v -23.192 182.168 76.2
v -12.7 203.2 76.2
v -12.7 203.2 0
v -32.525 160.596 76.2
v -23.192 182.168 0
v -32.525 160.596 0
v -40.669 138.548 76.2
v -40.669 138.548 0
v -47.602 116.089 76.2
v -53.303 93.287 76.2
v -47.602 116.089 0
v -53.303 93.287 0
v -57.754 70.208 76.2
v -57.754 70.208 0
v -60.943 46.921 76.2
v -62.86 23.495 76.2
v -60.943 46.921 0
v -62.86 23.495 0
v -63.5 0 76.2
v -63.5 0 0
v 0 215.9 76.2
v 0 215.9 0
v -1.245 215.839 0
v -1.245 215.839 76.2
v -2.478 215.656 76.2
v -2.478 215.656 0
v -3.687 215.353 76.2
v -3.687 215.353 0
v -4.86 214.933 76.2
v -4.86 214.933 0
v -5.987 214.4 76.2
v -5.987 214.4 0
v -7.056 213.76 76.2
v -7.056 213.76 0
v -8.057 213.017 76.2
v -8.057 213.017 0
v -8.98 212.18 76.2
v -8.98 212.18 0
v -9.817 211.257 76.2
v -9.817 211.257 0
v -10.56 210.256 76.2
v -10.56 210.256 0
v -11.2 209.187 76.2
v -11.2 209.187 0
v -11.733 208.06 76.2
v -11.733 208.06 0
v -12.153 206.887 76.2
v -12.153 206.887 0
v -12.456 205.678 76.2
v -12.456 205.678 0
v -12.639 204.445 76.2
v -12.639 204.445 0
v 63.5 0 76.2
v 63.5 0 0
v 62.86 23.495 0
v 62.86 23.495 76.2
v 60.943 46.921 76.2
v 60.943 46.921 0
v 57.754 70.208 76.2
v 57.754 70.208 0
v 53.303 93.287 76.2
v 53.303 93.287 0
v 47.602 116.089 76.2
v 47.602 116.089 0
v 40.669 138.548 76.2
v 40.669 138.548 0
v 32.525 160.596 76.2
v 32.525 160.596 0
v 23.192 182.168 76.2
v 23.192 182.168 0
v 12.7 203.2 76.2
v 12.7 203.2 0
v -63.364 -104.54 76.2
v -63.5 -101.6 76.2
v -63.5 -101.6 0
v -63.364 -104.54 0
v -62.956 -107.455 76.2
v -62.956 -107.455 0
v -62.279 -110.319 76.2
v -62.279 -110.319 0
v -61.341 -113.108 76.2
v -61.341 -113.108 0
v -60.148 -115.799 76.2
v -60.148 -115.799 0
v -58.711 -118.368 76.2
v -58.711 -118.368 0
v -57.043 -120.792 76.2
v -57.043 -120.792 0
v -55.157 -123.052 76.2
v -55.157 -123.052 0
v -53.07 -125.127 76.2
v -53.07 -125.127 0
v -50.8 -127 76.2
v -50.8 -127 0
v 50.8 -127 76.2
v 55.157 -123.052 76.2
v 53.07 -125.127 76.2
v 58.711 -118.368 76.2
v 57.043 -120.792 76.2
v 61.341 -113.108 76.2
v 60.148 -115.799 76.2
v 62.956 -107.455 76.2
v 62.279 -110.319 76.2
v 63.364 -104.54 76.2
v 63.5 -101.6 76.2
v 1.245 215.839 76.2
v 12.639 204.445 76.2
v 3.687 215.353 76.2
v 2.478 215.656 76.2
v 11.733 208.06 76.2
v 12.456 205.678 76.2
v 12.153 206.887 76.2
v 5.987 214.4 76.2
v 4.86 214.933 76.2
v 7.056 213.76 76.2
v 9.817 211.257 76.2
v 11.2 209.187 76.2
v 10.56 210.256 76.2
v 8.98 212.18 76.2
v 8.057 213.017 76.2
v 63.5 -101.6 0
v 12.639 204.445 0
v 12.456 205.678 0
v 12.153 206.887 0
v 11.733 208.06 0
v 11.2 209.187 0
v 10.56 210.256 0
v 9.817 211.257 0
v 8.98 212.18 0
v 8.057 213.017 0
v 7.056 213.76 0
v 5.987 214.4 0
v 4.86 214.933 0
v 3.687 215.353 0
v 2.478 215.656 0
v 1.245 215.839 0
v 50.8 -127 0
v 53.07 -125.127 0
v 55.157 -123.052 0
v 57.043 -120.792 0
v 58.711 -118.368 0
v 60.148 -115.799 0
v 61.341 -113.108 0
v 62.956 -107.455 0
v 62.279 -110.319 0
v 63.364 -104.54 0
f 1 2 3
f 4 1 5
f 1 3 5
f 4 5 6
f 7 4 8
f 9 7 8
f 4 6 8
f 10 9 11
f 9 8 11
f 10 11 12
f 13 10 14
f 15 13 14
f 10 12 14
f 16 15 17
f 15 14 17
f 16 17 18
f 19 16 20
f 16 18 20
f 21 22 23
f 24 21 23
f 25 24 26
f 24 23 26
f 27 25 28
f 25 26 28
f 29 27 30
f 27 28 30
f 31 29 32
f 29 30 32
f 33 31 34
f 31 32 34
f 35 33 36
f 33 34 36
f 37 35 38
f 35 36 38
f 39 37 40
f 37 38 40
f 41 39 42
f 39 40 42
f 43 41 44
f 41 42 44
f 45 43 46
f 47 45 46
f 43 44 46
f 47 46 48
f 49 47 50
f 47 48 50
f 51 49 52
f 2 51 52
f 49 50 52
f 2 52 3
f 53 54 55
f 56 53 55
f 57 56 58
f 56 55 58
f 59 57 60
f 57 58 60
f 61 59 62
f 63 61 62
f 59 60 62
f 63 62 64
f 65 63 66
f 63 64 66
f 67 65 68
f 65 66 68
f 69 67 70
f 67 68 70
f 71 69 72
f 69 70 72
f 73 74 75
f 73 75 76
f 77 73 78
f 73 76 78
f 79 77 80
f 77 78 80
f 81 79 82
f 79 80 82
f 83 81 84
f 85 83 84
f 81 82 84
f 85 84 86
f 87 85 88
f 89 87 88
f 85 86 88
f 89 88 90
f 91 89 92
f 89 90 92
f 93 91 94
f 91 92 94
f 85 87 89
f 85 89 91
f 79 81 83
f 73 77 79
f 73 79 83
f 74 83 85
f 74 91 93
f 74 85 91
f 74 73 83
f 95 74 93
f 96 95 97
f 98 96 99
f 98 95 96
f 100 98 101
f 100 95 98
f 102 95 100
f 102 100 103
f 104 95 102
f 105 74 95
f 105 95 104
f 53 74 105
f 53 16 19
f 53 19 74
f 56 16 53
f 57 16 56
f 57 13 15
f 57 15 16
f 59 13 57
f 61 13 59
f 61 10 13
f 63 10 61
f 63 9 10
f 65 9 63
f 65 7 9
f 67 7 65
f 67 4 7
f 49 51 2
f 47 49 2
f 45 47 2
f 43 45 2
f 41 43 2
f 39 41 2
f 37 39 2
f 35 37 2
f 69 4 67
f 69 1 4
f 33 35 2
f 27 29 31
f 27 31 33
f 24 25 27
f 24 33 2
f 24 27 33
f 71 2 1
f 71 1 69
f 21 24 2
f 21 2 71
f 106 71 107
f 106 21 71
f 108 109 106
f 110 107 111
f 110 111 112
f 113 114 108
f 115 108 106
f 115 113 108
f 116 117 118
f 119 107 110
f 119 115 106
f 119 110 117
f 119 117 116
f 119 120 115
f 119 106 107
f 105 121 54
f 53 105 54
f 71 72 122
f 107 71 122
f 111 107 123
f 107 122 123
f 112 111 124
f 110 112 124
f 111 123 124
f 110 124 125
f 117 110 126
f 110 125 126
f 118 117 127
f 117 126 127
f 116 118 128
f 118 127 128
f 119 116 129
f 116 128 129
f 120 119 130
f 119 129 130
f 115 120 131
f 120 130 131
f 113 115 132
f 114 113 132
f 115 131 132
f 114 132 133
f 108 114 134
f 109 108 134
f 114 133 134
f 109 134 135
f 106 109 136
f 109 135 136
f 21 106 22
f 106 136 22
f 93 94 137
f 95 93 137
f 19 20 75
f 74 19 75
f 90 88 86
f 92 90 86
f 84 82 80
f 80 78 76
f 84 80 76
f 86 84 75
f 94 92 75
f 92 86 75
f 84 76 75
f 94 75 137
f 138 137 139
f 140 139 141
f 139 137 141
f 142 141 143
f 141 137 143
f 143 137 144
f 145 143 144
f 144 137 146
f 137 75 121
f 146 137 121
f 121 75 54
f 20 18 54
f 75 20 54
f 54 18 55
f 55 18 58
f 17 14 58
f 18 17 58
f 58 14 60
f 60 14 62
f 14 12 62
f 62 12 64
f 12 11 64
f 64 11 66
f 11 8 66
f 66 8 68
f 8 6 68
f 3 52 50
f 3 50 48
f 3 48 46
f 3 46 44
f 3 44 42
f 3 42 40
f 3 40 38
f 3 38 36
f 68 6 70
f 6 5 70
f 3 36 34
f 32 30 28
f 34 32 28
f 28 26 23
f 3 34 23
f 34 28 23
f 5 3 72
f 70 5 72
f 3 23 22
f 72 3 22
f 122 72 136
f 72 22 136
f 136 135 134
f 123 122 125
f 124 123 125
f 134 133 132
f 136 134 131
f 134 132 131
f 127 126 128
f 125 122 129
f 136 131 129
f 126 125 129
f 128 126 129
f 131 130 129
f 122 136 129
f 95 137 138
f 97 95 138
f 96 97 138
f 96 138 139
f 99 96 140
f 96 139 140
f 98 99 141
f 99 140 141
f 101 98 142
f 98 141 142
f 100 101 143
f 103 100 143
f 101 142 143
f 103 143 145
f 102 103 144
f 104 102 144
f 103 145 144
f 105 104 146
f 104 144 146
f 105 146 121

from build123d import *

# Parameters (mm, degrees)
F1_DEPTH = 76.2


# Not quite as in the source:
# - a feature of the source that left no trace in its solid (it failed there, or was rolled back) is left out


with BuildPart() as f1:
    # F0 (on Top) → F1 (new body)
    with BuildSketch(Plane.XY):
        with BuildLine():
            Line((0, 203.2), (0, 0))
            Line((0, 0), (63.5, 0))
            ThreePointArc((63.5, 0), (50.6075315628, 104.7268828907), (12.7, 203.2))
            Line((12.7, 203.2), (0, 203.2))
        make_face()
        with BuildLine():
            Line((-63.5, 0), (0, 0))
            Line((0, 0), (0, 203.2))
            Line((0, 203.2), (-12.7, 203.2))
            ThreePointArc((-12.7, 203.2), (-50.6075315628, 104.7268828907), (-63.5, 0))
        make_face()
        with BuildLine():
            Line((0, 215.9), (0, 203.2))
            Line((0, 203.2), (12.7, 203.2))
            ThreePointArc((12.7, 203.2), (8.9802561211, 212.1802561211), (0, 215.9))
        make_face()
        with BuildLine():
            Line((-12.7, 203.2), (0, 203.2))
            Line((0, 203.2), (0, 215.9))
            ThreePointArc((0, 215.9), (-8.9802561211, 212.1802561211), (-12.7, 203.2))
        make_face()
        with BuildLine():
            Line((0, -127), (0, 0))
            Line((0, 0), (-63.5, 0))
            Line((-63.5, 0), (-63.5, -101.6))
            ThreePointArc((-63.5, -101.6), (-60.1480633142, -115.7990316571), (-50.8, -127))
            Line((-50.8, -127), (0, -127))
        make_face()
        with BuildLine():
            Line((63.5, 0), (0, 0))
            Line((0, 0), (0, -127))
            Line((0, -127), (50.8, -127))
            ThreePointArc((50.8, -127), (60.1480633142, -115.7990316571), (63.5, -101.6))
            Line((63.5, -101.6), (63.5, 0))
        make_face()
    extrude(amount=F1_DEPTH)


solid = f1.part
